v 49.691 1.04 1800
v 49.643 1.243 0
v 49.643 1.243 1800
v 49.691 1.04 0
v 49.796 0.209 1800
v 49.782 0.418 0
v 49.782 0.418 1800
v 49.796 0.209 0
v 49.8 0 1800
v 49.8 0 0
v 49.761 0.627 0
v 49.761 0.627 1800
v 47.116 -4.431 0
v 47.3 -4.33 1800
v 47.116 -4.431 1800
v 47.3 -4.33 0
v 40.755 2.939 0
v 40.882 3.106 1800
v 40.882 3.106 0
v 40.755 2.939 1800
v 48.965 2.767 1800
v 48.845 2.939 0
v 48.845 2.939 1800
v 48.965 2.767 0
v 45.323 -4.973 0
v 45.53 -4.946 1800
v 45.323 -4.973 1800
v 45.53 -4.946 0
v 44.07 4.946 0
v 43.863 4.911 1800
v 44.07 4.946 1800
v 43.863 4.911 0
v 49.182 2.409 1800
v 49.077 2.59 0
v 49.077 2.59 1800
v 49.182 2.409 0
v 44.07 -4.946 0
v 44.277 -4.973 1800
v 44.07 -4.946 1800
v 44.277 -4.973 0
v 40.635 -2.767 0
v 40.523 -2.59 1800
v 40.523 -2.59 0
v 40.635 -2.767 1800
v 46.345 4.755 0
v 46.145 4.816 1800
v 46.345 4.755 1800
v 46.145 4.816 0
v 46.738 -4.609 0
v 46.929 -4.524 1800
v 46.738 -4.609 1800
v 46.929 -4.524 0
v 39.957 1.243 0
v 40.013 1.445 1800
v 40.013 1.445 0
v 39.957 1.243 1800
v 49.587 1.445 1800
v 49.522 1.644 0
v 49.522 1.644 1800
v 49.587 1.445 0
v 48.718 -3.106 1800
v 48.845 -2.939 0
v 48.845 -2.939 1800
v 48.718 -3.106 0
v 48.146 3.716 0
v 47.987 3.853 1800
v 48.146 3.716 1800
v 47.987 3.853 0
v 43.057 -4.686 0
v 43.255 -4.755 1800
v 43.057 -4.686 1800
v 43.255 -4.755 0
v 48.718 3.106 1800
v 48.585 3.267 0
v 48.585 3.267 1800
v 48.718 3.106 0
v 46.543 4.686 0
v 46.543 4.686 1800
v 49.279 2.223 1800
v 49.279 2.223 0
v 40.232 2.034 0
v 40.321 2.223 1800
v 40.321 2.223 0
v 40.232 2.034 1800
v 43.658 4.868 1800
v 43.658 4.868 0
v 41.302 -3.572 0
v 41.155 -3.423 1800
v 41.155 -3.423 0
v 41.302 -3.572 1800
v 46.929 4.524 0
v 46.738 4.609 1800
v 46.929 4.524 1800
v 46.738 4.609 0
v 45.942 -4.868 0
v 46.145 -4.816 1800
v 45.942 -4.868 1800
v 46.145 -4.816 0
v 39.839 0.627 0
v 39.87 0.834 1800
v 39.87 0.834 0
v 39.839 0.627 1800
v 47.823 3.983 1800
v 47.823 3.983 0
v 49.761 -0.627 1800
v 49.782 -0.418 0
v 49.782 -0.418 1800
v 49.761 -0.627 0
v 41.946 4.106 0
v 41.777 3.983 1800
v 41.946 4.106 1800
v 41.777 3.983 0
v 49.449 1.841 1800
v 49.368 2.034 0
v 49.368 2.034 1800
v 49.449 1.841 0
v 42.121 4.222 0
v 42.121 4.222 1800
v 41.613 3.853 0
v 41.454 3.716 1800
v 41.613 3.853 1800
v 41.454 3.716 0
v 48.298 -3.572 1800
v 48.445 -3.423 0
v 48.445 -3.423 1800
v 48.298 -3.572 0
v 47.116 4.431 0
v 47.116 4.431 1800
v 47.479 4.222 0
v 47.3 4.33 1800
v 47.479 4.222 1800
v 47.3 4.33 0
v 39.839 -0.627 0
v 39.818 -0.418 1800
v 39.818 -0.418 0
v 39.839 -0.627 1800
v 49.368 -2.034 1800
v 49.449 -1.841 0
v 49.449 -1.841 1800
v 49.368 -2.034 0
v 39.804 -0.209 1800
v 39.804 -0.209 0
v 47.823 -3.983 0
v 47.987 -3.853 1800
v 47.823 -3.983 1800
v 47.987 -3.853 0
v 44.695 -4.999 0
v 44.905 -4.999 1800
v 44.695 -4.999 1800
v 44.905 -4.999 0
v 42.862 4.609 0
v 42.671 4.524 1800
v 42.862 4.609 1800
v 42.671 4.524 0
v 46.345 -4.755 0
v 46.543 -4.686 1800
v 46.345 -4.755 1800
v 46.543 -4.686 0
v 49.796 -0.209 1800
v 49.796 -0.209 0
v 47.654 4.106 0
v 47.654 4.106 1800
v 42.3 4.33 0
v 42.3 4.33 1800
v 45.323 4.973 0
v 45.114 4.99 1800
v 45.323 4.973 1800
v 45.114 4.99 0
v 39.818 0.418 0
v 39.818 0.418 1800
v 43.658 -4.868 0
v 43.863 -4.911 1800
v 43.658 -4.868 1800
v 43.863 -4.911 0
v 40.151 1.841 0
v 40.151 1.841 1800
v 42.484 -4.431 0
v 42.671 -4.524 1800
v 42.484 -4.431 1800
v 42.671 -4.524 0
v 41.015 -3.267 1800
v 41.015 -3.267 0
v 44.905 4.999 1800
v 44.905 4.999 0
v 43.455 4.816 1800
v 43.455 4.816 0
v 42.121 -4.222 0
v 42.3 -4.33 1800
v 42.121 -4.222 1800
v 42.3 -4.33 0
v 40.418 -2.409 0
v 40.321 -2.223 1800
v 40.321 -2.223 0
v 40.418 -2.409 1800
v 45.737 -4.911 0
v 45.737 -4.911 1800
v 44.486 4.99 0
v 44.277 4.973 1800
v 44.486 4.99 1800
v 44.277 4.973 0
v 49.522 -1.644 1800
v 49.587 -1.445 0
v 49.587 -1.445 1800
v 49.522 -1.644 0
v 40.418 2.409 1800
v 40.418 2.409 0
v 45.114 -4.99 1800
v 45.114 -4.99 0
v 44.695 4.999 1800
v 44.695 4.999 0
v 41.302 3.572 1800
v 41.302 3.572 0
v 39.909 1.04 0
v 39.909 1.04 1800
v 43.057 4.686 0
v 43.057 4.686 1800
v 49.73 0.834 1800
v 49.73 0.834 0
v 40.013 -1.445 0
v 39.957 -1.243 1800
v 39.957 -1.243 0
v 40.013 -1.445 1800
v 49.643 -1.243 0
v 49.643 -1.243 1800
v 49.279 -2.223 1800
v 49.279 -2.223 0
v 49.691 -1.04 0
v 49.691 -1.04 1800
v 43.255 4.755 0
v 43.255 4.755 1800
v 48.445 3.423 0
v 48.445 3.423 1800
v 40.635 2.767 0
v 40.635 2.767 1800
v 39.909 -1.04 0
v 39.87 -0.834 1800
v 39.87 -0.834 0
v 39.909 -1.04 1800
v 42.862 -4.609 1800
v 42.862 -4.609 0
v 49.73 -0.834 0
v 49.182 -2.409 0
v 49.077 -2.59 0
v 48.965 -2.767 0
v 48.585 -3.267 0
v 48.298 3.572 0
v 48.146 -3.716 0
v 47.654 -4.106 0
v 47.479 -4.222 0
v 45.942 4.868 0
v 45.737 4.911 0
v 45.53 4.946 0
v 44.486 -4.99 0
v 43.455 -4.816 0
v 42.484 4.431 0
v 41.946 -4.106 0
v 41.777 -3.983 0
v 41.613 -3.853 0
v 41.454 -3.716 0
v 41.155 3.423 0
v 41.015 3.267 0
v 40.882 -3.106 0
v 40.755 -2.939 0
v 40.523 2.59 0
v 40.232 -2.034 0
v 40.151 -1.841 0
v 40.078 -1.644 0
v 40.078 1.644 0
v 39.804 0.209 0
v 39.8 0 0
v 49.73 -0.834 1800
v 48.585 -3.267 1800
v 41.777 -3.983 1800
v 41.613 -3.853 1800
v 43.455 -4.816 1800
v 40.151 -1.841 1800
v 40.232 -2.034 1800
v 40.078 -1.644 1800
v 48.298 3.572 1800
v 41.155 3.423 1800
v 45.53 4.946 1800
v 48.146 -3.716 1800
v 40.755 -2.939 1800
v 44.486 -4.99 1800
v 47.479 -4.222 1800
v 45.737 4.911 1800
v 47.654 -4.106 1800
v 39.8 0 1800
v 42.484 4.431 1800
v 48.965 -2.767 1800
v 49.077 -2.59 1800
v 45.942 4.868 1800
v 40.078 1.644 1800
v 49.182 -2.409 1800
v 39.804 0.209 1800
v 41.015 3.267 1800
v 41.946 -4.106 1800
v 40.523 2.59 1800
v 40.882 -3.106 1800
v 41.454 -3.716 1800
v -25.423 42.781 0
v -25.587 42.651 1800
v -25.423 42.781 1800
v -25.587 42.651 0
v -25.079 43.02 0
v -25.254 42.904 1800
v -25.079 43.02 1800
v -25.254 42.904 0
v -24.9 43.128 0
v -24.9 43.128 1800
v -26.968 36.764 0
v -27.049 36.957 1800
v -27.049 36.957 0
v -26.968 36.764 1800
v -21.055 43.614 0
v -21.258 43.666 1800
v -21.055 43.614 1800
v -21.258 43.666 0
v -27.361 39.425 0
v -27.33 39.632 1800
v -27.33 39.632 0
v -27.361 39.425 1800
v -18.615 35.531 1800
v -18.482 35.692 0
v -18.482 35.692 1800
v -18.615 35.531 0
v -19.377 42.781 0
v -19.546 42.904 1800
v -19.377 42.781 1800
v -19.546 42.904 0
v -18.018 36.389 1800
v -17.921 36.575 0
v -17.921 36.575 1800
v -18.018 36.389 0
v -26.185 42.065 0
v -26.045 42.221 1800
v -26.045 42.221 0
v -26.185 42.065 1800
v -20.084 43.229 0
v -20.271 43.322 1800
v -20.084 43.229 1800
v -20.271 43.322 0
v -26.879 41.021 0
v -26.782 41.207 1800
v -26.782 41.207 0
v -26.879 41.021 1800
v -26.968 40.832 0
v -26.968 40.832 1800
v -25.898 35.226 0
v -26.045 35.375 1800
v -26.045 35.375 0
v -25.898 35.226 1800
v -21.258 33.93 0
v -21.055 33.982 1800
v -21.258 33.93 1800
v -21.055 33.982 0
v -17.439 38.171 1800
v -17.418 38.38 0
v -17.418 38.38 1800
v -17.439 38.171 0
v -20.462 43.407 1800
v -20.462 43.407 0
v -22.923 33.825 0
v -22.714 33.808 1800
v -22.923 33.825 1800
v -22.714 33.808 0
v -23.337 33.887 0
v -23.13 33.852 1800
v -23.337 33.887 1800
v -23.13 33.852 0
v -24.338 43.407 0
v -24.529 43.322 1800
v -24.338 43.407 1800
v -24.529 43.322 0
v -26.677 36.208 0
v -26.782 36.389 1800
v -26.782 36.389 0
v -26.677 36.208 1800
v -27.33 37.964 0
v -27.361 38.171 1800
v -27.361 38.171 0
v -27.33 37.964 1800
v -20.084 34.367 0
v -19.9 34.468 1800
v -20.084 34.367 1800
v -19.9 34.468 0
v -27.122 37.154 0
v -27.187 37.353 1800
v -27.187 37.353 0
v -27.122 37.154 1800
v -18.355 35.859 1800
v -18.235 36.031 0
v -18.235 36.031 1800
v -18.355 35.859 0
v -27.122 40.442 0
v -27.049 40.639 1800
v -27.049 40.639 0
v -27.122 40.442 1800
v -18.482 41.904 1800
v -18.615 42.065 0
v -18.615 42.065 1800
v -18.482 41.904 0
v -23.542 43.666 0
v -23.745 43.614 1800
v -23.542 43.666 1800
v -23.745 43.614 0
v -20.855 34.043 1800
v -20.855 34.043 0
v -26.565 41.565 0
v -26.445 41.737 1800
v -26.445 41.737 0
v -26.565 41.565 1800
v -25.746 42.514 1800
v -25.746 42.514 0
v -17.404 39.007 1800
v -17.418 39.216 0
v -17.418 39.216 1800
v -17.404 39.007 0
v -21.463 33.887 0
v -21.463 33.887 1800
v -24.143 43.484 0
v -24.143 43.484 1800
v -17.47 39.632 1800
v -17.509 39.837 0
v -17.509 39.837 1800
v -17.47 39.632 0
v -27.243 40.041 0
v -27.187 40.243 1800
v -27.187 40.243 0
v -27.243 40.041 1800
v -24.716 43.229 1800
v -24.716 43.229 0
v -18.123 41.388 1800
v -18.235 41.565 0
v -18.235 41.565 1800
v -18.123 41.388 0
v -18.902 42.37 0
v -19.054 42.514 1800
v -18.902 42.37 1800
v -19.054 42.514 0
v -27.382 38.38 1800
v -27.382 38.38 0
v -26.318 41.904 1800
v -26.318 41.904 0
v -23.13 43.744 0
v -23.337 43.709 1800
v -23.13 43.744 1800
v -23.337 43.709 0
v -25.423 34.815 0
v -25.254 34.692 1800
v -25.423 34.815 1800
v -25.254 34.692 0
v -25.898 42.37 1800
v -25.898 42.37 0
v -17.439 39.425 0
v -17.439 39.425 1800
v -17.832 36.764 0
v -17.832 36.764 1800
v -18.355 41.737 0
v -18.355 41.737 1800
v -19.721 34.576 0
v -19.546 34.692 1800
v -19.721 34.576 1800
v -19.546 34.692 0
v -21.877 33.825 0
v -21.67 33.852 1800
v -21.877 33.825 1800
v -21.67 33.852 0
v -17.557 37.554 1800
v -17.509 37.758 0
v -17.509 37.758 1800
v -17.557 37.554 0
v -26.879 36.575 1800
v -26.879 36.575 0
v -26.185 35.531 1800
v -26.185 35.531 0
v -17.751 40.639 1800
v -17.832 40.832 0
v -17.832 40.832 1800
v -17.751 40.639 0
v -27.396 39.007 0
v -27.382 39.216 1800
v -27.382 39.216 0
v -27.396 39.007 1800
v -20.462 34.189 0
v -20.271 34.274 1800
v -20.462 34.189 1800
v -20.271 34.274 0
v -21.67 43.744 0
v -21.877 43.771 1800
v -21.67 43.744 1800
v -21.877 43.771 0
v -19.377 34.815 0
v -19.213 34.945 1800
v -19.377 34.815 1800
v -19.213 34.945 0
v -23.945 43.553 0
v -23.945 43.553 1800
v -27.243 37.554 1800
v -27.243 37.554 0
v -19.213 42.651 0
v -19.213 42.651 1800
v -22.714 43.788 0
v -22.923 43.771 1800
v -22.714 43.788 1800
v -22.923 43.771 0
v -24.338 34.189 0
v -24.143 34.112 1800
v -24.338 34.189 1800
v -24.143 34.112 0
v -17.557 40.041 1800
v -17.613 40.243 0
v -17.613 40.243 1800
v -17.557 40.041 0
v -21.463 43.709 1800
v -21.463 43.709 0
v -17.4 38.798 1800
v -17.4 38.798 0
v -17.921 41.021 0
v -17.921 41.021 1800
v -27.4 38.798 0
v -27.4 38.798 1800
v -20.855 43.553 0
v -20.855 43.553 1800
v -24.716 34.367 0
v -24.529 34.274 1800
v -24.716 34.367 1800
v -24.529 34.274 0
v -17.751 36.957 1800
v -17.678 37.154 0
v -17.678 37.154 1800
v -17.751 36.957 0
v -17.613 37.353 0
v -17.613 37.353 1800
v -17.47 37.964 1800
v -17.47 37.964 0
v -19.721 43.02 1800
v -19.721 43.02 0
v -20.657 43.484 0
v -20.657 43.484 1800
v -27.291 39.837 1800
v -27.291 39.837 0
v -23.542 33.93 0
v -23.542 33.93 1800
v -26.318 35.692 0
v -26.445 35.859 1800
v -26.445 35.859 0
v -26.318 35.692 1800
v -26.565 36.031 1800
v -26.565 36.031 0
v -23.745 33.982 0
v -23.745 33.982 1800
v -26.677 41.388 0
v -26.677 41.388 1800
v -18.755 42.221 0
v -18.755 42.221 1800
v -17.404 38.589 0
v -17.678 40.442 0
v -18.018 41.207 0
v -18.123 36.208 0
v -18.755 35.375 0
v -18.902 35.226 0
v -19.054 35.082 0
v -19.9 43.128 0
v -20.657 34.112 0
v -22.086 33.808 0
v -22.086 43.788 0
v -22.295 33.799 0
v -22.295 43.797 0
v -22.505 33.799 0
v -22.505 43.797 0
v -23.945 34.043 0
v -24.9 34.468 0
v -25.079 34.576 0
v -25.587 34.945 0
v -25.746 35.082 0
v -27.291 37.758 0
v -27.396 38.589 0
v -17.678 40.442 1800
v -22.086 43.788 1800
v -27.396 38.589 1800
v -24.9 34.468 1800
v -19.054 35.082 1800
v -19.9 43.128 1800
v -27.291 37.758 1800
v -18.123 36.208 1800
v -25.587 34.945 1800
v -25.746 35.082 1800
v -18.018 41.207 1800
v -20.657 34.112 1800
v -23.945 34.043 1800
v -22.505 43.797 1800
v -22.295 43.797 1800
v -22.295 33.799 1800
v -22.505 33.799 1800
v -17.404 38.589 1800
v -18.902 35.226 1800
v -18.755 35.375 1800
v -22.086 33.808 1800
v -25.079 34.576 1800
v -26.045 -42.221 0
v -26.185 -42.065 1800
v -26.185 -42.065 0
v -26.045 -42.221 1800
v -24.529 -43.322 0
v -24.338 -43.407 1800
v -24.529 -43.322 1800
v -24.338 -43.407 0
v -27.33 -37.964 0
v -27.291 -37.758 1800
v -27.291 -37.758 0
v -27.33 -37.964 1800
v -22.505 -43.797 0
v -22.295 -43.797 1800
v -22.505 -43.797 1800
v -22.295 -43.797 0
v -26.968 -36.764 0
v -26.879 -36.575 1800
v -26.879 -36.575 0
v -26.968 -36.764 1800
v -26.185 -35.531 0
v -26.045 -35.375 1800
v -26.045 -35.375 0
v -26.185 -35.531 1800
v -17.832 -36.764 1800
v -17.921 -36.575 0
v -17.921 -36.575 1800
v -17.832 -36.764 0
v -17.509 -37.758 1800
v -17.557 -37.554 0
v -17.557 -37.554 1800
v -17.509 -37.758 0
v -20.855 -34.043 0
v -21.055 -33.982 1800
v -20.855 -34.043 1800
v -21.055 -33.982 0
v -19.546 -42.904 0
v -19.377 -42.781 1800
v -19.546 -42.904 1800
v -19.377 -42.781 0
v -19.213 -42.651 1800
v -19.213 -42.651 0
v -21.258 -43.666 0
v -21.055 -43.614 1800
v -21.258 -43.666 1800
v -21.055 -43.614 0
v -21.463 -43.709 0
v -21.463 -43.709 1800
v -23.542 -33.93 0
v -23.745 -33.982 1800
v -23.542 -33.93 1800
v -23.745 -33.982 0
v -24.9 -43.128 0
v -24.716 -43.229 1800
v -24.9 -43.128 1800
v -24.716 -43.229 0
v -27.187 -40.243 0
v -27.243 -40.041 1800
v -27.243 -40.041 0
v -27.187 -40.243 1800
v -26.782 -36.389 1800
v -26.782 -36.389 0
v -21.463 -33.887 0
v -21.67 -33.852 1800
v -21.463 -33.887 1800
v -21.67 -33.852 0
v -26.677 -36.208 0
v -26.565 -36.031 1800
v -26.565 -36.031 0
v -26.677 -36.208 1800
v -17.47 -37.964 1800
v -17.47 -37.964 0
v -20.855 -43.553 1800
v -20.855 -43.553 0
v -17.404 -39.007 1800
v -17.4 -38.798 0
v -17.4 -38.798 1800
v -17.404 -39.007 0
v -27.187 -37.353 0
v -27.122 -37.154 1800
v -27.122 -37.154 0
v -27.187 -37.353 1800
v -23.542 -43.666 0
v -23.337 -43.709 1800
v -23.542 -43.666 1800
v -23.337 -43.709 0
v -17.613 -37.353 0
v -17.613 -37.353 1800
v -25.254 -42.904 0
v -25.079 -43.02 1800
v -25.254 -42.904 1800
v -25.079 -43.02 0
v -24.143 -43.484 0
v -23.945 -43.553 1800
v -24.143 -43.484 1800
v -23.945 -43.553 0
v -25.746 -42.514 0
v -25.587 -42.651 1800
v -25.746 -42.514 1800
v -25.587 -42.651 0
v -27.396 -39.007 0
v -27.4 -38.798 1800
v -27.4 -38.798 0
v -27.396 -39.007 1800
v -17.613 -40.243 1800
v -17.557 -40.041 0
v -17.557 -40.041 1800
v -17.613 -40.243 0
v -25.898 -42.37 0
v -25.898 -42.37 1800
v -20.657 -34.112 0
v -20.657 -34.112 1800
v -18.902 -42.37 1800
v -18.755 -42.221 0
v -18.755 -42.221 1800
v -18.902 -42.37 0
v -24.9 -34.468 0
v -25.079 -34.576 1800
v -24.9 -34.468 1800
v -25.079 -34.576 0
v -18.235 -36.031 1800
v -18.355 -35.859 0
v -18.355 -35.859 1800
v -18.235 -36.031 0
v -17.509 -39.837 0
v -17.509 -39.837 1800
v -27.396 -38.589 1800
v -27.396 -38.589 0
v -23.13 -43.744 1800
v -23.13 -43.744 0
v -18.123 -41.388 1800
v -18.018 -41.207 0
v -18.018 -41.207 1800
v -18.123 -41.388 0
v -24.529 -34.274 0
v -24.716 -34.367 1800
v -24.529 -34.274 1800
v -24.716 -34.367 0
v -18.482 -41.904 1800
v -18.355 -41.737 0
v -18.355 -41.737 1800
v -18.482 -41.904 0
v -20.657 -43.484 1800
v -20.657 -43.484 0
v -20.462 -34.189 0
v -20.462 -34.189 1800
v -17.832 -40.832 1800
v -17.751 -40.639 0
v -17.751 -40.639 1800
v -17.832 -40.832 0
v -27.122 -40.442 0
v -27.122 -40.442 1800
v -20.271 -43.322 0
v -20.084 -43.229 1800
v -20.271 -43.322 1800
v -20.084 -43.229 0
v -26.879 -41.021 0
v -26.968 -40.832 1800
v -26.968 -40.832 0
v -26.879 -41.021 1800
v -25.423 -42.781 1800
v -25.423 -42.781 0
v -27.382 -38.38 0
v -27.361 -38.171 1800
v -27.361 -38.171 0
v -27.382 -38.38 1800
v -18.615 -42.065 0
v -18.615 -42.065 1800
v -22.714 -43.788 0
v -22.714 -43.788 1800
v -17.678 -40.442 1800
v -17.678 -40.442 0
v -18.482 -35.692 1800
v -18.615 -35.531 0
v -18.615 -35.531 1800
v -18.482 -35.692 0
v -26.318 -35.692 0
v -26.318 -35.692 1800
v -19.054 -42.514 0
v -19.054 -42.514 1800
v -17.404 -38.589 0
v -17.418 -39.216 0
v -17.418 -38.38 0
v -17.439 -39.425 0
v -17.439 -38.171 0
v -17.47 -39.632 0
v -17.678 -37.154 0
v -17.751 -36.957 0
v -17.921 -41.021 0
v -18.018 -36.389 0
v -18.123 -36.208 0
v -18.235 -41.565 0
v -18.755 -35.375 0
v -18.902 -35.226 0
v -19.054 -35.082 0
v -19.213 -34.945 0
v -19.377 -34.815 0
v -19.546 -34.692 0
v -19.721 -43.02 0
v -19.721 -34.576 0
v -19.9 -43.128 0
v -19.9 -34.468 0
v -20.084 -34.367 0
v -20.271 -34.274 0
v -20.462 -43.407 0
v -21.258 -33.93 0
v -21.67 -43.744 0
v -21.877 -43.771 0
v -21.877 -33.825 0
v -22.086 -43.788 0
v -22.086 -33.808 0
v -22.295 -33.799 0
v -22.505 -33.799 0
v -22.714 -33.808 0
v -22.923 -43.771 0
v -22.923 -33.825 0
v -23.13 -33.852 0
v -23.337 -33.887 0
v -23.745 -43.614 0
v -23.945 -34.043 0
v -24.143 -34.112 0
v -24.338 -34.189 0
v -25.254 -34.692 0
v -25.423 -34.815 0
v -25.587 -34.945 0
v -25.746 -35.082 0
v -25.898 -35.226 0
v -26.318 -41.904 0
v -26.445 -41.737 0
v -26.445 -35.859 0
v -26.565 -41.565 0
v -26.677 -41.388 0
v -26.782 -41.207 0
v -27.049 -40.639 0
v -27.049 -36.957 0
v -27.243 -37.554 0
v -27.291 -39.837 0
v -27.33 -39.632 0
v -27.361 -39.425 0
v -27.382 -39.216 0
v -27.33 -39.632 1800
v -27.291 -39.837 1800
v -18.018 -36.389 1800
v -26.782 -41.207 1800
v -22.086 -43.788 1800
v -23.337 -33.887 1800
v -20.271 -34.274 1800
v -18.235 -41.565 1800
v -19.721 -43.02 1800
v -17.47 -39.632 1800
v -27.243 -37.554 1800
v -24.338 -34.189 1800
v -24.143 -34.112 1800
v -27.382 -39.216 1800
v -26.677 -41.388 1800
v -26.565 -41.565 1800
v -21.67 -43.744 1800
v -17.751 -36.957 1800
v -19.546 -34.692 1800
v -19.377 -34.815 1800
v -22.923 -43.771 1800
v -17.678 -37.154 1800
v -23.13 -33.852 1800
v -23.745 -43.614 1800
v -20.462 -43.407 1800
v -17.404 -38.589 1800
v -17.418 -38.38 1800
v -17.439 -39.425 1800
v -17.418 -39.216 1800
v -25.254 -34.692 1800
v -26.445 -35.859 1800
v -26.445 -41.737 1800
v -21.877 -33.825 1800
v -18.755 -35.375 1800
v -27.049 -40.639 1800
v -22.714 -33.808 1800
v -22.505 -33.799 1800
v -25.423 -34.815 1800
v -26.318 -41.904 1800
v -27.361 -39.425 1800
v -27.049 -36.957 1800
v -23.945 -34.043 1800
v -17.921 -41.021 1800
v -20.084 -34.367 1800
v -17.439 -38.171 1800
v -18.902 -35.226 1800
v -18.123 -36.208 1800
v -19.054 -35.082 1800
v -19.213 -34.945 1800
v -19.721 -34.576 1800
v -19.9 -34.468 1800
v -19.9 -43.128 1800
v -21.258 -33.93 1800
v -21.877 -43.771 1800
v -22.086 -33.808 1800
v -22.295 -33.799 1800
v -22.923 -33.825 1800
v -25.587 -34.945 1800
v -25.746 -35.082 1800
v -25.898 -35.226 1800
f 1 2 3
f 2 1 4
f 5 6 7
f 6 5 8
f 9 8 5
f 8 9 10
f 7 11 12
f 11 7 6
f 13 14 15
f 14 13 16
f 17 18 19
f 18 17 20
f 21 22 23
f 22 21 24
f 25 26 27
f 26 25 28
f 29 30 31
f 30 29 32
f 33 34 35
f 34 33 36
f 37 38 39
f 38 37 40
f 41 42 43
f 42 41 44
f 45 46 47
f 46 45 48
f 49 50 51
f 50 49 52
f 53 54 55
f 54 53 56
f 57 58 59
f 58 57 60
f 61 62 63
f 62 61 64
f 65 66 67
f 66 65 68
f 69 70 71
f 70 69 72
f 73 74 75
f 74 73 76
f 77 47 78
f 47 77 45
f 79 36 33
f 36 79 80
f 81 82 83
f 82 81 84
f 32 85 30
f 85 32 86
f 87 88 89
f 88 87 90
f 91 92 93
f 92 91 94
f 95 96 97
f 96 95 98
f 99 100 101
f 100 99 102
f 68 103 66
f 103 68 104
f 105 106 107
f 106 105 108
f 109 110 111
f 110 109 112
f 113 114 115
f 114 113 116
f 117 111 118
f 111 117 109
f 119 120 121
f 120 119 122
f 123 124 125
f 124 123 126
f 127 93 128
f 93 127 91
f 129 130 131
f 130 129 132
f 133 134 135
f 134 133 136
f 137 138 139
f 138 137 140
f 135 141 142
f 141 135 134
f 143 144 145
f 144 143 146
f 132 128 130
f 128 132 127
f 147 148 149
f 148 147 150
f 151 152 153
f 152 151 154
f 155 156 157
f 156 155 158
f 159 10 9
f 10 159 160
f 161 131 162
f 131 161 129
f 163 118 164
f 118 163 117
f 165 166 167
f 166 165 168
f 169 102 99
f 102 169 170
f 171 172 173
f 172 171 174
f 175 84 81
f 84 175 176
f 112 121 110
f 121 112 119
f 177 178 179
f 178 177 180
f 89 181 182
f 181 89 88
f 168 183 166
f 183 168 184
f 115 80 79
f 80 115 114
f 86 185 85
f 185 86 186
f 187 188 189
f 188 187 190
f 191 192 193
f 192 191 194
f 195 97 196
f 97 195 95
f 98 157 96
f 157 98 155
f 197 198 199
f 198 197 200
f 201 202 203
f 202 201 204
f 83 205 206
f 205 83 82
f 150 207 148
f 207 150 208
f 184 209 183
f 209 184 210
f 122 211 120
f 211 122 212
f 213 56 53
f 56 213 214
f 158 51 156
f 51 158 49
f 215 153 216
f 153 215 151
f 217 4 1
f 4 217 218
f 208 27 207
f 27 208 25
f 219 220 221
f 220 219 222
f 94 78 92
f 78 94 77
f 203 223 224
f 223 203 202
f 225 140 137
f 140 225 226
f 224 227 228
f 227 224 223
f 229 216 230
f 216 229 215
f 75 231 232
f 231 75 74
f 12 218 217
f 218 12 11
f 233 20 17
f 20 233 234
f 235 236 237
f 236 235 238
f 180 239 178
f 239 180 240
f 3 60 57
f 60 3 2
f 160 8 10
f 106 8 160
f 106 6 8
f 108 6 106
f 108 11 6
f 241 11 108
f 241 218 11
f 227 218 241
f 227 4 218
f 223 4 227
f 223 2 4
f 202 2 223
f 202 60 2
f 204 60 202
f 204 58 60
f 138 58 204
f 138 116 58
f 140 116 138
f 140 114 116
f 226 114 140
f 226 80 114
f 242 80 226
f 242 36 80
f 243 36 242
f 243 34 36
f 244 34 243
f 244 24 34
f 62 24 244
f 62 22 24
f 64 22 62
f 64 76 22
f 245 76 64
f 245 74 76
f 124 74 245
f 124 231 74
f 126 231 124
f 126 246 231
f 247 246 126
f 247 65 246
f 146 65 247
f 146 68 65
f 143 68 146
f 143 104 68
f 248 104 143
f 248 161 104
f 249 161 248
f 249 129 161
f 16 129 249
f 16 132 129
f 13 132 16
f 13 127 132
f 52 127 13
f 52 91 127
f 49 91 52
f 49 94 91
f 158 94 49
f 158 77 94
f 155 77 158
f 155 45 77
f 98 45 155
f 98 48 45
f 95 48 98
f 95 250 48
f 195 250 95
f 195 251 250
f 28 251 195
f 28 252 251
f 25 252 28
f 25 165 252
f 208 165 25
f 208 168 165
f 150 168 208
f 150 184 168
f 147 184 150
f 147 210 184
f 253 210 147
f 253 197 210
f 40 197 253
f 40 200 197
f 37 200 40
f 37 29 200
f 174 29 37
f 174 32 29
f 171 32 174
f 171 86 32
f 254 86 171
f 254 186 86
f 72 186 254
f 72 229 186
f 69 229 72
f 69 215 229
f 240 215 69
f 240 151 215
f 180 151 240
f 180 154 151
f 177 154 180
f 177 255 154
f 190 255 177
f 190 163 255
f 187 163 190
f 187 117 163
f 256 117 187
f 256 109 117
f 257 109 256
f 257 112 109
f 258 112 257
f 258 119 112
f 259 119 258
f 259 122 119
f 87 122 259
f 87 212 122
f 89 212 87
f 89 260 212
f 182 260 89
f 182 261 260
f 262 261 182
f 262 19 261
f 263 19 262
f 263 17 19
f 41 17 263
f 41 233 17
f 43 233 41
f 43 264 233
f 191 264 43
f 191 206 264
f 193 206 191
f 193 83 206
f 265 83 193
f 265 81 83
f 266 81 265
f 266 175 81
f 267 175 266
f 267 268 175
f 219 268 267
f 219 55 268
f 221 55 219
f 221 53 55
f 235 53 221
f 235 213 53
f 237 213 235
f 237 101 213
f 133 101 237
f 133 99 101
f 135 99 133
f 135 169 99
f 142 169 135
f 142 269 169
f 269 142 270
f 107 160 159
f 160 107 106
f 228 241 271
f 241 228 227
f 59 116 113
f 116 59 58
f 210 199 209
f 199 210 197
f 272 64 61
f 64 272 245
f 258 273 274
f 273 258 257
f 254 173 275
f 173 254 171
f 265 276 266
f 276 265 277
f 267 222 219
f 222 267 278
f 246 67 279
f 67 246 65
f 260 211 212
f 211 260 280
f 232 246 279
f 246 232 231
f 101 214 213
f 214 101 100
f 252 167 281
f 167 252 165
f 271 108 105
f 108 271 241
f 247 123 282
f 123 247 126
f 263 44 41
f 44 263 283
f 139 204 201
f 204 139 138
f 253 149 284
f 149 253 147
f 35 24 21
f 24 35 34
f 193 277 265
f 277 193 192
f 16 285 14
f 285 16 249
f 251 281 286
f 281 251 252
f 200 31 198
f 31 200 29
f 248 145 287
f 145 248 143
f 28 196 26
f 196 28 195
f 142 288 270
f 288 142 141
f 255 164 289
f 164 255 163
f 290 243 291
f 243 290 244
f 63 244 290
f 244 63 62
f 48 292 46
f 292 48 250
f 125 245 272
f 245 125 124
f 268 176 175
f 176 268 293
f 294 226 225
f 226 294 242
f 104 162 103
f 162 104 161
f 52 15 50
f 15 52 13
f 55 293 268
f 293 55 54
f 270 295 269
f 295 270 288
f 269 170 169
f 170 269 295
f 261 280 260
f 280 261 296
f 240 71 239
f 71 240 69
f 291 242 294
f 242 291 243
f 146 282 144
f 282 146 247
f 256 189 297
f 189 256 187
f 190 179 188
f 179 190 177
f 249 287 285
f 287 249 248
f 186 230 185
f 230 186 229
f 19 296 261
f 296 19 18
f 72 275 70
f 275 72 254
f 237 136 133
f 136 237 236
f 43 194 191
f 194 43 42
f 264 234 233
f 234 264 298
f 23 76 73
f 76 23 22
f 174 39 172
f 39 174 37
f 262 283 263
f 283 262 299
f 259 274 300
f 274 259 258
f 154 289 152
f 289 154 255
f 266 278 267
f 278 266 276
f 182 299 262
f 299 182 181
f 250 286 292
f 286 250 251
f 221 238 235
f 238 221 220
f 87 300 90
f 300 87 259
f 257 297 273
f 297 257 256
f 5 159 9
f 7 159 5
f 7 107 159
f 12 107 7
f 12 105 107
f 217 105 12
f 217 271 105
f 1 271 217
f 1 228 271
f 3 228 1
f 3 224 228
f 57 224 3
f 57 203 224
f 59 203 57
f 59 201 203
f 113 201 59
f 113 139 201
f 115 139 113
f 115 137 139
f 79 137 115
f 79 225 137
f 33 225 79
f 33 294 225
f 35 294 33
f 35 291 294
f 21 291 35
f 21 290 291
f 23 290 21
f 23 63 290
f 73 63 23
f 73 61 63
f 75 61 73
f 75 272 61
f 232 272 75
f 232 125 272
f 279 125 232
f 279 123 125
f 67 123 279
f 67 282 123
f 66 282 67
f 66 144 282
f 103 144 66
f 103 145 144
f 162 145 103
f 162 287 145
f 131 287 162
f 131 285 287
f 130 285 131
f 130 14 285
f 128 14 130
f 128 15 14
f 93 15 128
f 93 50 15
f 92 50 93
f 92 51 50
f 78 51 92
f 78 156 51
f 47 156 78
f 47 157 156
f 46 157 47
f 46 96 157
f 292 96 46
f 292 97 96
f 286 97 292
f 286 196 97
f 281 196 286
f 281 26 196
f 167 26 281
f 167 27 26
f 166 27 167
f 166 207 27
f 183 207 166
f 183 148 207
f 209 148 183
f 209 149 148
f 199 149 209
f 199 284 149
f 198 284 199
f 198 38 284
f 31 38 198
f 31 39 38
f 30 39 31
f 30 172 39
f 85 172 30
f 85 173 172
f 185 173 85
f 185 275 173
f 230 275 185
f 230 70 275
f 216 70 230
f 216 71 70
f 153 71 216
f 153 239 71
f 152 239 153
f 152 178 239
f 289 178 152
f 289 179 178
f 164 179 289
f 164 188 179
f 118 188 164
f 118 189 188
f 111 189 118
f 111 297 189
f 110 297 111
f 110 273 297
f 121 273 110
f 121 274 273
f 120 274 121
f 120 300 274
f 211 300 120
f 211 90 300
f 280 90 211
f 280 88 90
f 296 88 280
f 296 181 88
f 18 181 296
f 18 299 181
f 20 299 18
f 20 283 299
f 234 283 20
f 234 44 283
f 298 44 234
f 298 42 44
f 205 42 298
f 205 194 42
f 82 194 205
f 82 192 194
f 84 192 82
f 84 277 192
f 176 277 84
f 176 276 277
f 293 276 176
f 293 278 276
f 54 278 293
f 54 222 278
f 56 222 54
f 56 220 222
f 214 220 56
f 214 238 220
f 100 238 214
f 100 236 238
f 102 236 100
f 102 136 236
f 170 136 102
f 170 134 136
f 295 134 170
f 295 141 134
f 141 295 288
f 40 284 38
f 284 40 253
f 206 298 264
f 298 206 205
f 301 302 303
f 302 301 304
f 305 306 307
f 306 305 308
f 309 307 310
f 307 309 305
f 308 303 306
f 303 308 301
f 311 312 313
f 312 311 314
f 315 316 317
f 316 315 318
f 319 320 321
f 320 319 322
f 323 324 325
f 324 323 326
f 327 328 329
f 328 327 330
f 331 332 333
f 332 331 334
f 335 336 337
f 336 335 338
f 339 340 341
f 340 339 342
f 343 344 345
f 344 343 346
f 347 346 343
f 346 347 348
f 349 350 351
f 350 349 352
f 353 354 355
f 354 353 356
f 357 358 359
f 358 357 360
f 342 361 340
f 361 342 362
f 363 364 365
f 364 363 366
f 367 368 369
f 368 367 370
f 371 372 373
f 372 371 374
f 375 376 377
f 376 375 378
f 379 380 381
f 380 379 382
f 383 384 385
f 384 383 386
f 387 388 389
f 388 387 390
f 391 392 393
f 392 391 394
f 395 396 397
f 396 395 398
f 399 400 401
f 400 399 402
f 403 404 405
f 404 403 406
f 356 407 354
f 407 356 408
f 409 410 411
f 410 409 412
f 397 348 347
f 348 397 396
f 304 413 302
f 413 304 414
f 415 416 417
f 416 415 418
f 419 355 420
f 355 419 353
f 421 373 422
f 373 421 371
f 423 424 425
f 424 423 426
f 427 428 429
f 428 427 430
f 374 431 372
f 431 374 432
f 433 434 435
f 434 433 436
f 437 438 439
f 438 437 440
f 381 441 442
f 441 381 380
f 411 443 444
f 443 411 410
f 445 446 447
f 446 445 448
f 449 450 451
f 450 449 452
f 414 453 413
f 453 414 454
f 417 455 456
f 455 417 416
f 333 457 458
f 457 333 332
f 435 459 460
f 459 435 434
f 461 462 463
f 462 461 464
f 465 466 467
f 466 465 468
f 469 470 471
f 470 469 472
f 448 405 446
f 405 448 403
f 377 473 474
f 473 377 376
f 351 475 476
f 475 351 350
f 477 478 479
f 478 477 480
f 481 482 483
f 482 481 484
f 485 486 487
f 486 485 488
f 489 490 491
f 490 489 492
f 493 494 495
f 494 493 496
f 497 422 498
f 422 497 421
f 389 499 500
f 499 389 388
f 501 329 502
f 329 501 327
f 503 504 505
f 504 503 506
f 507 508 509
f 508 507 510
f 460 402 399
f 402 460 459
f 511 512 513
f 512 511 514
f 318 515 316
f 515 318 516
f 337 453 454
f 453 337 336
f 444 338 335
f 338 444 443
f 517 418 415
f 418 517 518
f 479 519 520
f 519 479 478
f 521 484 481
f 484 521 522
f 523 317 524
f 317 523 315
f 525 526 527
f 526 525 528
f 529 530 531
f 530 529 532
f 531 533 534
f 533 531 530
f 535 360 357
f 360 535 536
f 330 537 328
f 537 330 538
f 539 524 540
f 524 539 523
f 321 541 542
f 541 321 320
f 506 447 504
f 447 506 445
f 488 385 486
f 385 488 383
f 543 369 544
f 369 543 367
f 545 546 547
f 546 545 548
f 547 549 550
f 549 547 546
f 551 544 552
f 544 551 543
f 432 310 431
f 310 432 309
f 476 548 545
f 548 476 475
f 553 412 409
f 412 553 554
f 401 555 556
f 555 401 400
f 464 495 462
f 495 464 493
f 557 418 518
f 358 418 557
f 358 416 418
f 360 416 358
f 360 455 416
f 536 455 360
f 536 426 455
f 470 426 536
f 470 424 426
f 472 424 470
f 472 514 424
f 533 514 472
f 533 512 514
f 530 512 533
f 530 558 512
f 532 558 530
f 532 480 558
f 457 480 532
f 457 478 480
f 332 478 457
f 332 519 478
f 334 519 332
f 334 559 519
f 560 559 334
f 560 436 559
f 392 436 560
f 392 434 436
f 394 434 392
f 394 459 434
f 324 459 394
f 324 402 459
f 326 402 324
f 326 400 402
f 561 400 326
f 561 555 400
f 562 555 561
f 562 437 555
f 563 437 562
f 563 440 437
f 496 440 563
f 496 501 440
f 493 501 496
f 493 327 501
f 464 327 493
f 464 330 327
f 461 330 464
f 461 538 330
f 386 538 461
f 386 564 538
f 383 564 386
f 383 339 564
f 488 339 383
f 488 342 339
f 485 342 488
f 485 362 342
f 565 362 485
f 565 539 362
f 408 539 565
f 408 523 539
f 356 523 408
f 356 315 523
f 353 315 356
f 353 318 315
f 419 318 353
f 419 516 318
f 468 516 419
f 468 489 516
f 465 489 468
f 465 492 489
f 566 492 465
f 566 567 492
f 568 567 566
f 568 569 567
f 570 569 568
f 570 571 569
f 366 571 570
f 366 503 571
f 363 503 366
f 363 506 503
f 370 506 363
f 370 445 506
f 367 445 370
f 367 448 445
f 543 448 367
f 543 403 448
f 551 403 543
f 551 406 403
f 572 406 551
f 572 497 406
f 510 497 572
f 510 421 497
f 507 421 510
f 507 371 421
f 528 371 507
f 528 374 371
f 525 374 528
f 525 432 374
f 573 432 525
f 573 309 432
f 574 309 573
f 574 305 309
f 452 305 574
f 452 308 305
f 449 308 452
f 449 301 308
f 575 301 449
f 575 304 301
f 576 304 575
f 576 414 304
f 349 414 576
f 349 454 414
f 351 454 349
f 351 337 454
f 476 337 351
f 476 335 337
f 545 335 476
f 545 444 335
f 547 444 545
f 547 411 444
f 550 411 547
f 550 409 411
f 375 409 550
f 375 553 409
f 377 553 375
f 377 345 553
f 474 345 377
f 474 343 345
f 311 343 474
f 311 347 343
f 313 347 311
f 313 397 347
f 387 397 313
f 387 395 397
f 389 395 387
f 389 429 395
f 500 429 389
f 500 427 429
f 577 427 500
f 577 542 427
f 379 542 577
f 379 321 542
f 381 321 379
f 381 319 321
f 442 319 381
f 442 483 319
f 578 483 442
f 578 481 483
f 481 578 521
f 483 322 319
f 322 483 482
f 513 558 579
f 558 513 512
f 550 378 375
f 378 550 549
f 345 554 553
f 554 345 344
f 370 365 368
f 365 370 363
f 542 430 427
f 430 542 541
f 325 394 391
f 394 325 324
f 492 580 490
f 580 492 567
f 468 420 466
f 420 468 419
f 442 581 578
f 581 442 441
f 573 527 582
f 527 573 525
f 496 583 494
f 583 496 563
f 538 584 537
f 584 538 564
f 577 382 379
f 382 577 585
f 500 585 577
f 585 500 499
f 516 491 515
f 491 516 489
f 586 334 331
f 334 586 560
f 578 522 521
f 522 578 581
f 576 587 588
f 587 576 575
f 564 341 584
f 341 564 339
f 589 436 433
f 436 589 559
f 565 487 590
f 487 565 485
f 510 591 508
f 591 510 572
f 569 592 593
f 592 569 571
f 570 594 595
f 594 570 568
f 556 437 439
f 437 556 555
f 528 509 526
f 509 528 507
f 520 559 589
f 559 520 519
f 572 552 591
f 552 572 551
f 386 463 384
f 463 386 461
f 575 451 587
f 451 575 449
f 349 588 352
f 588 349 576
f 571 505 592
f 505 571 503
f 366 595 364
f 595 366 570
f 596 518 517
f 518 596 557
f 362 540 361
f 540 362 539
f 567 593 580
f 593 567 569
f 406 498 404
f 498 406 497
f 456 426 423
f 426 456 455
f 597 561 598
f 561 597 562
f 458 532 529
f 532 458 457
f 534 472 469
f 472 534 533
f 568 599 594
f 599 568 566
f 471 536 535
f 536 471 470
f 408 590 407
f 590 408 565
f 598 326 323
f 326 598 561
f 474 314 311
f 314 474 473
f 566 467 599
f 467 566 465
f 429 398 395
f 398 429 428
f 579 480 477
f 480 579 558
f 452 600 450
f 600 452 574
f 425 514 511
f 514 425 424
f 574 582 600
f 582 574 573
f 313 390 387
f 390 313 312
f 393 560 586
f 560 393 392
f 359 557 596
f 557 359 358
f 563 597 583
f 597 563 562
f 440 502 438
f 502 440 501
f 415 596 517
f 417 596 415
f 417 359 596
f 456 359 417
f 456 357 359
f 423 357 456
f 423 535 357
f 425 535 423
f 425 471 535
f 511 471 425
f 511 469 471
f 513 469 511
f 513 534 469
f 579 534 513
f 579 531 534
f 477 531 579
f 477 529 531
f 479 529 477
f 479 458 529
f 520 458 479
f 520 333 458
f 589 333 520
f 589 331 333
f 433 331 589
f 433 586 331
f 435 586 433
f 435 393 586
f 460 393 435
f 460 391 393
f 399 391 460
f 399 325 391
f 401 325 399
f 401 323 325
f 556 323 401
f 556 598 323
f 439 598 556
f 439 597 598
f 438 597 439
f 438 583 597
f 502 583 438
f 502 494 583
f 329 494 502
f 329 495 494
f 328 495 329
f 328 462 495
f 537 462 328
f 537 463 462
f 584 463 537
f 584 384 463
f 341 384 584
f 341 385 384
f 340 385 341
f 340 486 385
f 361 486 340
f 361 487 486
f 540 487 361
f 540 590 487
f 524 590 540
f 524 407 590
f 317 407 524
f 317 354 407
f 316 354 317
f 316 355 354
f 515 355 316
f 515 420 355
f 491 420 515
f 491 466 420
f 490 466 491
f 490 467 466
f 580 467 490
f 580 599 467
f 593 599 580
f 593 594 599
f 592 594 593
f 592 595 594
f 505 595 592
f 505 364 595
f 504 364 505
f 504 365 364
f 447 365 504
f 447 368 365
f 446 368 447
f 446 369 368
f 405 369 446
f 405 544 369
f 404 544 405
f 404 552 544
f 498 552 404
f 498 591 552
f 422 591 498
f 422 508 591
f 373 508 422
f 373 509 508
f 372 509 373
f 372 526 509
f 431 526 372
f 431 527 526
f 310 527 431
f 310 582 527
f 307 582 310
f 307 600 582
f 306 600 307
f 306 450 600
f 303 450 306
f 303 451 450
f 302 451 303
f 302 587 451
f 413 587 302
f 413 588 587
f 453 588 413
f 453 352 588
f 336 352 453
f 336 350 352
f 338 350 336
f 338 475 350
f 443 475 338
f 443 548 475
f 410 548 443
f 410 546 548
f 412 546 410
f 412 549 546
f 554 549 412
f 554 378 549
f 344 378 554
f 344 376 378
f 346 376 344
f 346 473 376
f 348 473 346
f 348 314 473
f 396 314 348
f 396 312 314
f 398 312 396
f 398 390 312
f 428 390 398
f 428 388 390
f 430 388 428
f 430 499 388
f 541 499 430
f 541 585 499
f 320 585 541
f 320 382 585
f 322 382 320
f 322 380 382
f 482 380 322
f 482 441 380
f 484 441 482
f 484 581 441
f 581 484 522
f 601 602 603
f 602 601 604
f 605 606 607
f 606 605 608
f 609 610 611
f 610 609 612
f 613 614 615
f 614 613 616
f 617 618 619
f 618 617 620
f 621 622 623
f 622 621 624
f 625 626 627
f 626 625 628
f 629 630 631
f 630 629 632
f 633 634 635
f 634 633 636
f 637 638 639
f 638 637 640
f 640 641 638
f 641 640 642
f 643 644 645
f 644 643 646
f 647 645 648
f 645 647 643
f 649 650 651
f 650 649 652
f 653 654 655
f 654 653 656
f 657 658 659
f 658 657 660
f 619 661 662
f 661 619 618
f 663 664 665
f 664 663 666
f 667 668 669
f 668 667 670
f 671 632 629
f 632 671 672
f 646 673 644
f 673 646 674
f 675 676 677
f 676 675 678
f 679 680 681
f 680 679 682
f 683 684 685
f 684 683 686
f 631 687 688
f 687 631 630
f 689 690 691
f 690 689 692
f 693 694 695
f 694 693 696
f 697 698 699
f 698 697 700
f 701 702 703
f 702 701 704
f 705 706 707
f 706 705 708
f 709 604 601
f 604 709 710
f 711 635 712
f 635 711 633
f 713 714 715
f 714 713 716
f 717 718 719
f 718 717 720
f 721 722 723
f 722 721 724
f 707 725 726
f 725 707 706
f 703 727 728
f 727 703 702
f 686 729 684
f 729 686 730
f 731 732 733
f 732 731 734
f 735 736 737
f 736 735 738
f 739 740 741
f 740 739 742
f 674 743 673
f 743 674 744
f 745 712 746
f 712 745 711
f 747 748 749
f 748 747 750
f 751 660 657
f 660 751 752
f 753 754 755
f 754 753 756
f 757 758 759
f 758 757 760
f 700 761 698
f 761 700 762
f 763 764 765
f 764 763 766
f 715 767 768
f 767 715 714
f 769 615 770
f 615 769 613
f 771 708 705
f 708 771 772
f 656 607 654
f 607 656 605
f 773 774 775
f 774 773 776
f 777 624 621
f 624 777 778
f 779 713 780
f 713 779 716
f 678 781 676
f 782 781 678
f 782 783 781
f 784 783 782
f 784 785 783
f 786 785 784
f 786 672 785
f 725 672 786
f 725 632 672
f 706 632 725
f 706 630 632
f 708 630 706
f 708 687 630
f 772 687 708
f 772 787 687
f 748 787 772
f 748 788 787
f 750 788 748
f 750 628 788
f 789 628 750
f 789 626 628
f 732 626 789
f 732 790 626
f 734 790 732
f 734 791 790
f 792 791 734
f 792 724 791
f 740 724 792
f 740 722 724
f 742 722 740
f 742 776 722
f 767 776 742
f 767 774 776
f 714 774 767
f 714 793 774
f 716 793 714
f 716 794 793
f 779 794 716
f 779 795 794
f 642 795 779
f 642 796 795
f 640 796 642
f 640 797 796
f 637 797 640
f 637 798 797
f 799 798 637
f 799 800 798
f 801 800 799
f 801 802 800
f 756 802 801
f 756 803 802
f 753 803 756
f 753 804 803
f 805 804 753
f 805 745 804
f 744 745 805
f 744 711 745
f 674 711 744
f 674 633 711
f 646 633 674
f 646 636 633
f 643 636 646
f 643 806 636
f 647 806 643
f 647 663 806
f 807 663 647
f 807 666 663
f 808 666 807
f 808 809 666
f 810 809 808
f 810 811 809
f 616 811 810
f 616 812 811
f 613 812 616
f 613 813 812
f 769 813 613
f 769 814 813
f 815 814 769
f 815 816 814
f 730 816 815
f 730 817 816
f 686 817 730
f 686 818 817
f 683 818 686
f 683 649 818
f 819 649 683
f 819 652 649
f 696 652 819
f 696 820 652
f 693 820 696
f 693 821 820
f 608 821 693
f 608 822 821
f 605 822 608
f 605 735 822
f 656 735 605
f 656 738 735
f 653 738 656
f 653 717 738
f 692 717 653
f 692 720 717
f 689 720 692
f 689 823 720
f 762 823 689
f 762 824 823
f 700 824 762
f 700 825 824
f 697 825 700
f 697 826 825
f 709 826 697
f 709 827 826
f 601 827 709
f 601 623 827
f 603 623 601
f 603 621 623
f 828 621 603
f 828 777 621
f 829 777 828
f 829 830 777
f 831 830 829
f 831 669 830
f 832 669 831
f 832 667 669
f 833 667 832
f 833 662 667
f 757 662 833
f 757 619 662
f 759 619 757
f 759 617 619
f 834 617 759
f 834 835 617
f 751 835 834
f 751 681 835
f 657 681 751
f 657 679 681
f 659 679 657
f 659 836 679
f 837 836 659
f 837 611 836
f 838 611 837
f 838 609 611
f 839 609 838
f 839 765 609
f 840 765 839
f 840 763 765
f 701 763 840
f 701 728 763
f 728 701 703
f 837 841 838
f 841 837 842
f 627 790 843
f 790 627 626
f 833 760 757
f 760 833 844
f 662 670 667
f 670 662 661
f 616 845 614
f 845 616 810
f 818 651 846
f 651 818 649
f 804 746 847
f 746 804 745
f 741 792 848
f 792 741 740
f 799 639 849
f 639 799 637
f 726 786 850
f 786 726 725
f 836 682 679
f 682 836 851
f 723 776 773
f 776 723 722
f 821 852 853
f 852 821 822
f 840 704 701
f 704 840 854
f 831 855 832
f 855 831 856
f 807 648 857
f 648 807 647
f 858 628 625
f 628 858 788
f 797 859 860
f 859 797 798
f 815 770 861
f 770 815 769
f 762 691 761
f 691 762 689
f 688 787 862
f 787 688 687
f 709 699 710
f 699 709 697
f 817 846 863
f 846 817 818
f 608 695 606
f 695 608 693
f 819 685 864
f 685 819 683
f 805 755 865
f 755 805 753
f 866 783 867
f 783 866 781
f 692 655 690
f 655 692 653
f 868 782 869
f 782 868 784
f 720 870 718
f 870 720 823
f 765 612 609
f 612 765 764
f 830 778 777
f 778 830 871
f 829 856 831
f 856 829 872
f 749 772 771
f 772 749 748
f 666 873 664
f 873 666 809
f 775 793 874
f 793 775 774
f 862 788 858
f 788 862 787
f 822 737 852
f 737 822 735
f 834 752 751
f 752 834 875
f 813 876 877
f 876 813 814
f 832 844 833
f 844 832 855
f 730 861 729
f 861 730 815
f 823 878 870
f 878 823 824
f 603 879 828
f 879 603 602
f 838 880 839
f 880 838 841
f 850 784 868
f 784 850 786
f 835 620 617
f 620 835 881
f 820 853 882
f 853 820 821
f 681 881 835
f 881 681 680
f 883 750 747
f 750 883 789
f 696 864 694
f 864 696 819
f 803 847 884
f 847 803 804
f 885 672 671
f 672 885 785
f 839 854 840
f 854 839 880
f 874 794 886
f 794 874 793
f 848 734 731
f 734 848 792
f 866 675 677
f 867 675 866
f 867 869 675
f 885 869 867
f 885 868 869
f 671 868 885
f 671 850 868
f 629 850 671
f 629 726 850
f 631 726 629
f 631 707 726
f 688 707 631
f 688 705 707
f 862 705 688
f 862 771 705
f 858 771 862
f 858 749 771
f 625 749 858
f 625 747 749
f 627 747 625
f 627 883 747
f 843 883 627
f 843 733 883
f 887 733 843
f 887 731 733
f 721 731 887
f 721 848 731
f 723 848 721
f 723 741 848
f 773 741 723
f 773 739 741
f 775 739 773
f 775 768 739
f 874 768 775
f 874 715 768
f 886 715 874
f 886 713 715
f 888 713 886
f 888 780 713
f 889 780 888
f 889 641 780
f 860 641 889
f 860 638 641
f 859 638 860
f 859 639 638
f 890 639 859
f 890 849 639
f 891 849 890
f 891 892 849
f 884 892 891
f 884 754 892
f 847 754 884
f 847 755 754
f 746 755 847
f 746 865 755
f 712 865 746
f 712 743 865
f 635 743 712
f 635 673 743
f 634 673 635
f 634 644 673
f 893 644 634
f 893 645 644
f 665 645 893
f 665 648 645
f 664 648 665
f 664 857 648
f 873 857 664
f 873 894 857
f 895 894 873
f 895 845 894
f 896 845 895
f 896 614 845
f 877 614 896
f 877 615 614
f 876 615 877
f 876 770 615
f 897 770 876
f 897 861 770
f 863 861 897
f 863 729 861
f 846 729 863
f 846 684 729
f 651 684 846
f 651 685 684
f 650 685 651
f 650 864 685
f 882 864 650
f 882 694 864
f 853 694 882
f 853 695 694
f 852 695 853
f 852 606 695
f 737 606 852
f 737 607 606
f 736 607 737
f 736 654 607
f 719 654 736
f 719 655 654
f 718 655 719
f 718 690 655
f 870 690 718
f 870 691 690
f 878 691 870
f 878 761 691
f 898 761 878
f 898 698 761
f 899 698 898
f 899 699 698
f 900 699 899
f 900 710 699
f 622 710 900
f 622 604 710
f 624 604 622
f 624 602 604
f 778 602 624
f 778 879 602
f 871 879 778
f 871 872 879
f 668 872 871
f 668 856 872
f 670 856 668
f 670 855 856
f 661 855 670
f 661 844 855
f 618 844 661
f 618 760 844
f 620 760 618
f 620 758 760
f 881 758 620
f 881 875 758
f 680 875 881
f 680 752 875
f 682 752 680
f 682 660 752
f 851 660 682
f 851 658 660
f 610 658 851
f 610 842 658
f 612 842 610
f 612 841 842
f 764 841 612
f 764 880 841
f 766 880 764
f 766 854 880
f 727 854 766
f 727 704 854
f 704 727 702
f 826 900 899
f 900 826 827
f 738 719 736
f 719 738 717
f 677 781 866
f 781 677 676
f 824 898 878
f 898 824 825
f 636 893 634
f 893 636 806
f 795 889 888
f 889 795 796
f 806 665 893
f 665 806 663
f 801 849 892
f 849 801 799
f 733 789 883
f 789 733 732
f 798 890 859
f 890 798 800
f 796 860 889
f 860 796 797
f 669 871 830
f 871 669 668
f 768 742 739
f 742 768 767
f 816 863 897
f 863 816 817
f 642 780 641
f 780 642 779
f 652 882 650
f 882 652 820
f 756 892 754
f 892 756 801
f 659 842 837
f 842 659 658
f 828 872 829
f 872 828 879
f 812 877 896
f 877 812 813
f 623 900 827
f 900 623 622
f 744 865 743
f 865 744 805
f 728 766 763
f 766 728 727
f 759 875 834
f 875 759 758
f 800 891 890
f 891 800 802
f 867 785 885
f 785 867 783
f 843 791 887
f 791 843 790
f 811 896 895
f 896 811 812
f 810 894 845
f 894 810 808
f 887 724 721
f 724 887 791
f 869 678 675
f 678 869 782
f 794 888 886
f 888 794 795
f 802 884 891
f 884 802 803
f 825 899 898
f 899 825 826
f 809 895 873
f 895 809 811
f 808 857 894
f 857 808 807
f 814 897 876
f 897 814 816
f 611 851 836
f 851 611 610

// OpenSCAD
// file: config.scad
$fn = 150;

body_height = 1800;
skin_int_dia = 110;

wings_thickness = 3;
wings_m = 200;
wings_n = 130;
wings_p = 127;
wings_E = 138;

ring_ext_dia = skin_int_dia - 0.4;
// main file
include <config.scad>;

module bars(margin=0) {
     n = 3;
     diameter = 10;

     group_radius = (ring_ext_dia - 20)/2;

     for (i = [0:n])
          rotate([0, 0, i * 360 / n])
               translate([group_radius, 0, 0])
               cylinder(r=diameter/2 + margin, h=body_height);
}

bars();
